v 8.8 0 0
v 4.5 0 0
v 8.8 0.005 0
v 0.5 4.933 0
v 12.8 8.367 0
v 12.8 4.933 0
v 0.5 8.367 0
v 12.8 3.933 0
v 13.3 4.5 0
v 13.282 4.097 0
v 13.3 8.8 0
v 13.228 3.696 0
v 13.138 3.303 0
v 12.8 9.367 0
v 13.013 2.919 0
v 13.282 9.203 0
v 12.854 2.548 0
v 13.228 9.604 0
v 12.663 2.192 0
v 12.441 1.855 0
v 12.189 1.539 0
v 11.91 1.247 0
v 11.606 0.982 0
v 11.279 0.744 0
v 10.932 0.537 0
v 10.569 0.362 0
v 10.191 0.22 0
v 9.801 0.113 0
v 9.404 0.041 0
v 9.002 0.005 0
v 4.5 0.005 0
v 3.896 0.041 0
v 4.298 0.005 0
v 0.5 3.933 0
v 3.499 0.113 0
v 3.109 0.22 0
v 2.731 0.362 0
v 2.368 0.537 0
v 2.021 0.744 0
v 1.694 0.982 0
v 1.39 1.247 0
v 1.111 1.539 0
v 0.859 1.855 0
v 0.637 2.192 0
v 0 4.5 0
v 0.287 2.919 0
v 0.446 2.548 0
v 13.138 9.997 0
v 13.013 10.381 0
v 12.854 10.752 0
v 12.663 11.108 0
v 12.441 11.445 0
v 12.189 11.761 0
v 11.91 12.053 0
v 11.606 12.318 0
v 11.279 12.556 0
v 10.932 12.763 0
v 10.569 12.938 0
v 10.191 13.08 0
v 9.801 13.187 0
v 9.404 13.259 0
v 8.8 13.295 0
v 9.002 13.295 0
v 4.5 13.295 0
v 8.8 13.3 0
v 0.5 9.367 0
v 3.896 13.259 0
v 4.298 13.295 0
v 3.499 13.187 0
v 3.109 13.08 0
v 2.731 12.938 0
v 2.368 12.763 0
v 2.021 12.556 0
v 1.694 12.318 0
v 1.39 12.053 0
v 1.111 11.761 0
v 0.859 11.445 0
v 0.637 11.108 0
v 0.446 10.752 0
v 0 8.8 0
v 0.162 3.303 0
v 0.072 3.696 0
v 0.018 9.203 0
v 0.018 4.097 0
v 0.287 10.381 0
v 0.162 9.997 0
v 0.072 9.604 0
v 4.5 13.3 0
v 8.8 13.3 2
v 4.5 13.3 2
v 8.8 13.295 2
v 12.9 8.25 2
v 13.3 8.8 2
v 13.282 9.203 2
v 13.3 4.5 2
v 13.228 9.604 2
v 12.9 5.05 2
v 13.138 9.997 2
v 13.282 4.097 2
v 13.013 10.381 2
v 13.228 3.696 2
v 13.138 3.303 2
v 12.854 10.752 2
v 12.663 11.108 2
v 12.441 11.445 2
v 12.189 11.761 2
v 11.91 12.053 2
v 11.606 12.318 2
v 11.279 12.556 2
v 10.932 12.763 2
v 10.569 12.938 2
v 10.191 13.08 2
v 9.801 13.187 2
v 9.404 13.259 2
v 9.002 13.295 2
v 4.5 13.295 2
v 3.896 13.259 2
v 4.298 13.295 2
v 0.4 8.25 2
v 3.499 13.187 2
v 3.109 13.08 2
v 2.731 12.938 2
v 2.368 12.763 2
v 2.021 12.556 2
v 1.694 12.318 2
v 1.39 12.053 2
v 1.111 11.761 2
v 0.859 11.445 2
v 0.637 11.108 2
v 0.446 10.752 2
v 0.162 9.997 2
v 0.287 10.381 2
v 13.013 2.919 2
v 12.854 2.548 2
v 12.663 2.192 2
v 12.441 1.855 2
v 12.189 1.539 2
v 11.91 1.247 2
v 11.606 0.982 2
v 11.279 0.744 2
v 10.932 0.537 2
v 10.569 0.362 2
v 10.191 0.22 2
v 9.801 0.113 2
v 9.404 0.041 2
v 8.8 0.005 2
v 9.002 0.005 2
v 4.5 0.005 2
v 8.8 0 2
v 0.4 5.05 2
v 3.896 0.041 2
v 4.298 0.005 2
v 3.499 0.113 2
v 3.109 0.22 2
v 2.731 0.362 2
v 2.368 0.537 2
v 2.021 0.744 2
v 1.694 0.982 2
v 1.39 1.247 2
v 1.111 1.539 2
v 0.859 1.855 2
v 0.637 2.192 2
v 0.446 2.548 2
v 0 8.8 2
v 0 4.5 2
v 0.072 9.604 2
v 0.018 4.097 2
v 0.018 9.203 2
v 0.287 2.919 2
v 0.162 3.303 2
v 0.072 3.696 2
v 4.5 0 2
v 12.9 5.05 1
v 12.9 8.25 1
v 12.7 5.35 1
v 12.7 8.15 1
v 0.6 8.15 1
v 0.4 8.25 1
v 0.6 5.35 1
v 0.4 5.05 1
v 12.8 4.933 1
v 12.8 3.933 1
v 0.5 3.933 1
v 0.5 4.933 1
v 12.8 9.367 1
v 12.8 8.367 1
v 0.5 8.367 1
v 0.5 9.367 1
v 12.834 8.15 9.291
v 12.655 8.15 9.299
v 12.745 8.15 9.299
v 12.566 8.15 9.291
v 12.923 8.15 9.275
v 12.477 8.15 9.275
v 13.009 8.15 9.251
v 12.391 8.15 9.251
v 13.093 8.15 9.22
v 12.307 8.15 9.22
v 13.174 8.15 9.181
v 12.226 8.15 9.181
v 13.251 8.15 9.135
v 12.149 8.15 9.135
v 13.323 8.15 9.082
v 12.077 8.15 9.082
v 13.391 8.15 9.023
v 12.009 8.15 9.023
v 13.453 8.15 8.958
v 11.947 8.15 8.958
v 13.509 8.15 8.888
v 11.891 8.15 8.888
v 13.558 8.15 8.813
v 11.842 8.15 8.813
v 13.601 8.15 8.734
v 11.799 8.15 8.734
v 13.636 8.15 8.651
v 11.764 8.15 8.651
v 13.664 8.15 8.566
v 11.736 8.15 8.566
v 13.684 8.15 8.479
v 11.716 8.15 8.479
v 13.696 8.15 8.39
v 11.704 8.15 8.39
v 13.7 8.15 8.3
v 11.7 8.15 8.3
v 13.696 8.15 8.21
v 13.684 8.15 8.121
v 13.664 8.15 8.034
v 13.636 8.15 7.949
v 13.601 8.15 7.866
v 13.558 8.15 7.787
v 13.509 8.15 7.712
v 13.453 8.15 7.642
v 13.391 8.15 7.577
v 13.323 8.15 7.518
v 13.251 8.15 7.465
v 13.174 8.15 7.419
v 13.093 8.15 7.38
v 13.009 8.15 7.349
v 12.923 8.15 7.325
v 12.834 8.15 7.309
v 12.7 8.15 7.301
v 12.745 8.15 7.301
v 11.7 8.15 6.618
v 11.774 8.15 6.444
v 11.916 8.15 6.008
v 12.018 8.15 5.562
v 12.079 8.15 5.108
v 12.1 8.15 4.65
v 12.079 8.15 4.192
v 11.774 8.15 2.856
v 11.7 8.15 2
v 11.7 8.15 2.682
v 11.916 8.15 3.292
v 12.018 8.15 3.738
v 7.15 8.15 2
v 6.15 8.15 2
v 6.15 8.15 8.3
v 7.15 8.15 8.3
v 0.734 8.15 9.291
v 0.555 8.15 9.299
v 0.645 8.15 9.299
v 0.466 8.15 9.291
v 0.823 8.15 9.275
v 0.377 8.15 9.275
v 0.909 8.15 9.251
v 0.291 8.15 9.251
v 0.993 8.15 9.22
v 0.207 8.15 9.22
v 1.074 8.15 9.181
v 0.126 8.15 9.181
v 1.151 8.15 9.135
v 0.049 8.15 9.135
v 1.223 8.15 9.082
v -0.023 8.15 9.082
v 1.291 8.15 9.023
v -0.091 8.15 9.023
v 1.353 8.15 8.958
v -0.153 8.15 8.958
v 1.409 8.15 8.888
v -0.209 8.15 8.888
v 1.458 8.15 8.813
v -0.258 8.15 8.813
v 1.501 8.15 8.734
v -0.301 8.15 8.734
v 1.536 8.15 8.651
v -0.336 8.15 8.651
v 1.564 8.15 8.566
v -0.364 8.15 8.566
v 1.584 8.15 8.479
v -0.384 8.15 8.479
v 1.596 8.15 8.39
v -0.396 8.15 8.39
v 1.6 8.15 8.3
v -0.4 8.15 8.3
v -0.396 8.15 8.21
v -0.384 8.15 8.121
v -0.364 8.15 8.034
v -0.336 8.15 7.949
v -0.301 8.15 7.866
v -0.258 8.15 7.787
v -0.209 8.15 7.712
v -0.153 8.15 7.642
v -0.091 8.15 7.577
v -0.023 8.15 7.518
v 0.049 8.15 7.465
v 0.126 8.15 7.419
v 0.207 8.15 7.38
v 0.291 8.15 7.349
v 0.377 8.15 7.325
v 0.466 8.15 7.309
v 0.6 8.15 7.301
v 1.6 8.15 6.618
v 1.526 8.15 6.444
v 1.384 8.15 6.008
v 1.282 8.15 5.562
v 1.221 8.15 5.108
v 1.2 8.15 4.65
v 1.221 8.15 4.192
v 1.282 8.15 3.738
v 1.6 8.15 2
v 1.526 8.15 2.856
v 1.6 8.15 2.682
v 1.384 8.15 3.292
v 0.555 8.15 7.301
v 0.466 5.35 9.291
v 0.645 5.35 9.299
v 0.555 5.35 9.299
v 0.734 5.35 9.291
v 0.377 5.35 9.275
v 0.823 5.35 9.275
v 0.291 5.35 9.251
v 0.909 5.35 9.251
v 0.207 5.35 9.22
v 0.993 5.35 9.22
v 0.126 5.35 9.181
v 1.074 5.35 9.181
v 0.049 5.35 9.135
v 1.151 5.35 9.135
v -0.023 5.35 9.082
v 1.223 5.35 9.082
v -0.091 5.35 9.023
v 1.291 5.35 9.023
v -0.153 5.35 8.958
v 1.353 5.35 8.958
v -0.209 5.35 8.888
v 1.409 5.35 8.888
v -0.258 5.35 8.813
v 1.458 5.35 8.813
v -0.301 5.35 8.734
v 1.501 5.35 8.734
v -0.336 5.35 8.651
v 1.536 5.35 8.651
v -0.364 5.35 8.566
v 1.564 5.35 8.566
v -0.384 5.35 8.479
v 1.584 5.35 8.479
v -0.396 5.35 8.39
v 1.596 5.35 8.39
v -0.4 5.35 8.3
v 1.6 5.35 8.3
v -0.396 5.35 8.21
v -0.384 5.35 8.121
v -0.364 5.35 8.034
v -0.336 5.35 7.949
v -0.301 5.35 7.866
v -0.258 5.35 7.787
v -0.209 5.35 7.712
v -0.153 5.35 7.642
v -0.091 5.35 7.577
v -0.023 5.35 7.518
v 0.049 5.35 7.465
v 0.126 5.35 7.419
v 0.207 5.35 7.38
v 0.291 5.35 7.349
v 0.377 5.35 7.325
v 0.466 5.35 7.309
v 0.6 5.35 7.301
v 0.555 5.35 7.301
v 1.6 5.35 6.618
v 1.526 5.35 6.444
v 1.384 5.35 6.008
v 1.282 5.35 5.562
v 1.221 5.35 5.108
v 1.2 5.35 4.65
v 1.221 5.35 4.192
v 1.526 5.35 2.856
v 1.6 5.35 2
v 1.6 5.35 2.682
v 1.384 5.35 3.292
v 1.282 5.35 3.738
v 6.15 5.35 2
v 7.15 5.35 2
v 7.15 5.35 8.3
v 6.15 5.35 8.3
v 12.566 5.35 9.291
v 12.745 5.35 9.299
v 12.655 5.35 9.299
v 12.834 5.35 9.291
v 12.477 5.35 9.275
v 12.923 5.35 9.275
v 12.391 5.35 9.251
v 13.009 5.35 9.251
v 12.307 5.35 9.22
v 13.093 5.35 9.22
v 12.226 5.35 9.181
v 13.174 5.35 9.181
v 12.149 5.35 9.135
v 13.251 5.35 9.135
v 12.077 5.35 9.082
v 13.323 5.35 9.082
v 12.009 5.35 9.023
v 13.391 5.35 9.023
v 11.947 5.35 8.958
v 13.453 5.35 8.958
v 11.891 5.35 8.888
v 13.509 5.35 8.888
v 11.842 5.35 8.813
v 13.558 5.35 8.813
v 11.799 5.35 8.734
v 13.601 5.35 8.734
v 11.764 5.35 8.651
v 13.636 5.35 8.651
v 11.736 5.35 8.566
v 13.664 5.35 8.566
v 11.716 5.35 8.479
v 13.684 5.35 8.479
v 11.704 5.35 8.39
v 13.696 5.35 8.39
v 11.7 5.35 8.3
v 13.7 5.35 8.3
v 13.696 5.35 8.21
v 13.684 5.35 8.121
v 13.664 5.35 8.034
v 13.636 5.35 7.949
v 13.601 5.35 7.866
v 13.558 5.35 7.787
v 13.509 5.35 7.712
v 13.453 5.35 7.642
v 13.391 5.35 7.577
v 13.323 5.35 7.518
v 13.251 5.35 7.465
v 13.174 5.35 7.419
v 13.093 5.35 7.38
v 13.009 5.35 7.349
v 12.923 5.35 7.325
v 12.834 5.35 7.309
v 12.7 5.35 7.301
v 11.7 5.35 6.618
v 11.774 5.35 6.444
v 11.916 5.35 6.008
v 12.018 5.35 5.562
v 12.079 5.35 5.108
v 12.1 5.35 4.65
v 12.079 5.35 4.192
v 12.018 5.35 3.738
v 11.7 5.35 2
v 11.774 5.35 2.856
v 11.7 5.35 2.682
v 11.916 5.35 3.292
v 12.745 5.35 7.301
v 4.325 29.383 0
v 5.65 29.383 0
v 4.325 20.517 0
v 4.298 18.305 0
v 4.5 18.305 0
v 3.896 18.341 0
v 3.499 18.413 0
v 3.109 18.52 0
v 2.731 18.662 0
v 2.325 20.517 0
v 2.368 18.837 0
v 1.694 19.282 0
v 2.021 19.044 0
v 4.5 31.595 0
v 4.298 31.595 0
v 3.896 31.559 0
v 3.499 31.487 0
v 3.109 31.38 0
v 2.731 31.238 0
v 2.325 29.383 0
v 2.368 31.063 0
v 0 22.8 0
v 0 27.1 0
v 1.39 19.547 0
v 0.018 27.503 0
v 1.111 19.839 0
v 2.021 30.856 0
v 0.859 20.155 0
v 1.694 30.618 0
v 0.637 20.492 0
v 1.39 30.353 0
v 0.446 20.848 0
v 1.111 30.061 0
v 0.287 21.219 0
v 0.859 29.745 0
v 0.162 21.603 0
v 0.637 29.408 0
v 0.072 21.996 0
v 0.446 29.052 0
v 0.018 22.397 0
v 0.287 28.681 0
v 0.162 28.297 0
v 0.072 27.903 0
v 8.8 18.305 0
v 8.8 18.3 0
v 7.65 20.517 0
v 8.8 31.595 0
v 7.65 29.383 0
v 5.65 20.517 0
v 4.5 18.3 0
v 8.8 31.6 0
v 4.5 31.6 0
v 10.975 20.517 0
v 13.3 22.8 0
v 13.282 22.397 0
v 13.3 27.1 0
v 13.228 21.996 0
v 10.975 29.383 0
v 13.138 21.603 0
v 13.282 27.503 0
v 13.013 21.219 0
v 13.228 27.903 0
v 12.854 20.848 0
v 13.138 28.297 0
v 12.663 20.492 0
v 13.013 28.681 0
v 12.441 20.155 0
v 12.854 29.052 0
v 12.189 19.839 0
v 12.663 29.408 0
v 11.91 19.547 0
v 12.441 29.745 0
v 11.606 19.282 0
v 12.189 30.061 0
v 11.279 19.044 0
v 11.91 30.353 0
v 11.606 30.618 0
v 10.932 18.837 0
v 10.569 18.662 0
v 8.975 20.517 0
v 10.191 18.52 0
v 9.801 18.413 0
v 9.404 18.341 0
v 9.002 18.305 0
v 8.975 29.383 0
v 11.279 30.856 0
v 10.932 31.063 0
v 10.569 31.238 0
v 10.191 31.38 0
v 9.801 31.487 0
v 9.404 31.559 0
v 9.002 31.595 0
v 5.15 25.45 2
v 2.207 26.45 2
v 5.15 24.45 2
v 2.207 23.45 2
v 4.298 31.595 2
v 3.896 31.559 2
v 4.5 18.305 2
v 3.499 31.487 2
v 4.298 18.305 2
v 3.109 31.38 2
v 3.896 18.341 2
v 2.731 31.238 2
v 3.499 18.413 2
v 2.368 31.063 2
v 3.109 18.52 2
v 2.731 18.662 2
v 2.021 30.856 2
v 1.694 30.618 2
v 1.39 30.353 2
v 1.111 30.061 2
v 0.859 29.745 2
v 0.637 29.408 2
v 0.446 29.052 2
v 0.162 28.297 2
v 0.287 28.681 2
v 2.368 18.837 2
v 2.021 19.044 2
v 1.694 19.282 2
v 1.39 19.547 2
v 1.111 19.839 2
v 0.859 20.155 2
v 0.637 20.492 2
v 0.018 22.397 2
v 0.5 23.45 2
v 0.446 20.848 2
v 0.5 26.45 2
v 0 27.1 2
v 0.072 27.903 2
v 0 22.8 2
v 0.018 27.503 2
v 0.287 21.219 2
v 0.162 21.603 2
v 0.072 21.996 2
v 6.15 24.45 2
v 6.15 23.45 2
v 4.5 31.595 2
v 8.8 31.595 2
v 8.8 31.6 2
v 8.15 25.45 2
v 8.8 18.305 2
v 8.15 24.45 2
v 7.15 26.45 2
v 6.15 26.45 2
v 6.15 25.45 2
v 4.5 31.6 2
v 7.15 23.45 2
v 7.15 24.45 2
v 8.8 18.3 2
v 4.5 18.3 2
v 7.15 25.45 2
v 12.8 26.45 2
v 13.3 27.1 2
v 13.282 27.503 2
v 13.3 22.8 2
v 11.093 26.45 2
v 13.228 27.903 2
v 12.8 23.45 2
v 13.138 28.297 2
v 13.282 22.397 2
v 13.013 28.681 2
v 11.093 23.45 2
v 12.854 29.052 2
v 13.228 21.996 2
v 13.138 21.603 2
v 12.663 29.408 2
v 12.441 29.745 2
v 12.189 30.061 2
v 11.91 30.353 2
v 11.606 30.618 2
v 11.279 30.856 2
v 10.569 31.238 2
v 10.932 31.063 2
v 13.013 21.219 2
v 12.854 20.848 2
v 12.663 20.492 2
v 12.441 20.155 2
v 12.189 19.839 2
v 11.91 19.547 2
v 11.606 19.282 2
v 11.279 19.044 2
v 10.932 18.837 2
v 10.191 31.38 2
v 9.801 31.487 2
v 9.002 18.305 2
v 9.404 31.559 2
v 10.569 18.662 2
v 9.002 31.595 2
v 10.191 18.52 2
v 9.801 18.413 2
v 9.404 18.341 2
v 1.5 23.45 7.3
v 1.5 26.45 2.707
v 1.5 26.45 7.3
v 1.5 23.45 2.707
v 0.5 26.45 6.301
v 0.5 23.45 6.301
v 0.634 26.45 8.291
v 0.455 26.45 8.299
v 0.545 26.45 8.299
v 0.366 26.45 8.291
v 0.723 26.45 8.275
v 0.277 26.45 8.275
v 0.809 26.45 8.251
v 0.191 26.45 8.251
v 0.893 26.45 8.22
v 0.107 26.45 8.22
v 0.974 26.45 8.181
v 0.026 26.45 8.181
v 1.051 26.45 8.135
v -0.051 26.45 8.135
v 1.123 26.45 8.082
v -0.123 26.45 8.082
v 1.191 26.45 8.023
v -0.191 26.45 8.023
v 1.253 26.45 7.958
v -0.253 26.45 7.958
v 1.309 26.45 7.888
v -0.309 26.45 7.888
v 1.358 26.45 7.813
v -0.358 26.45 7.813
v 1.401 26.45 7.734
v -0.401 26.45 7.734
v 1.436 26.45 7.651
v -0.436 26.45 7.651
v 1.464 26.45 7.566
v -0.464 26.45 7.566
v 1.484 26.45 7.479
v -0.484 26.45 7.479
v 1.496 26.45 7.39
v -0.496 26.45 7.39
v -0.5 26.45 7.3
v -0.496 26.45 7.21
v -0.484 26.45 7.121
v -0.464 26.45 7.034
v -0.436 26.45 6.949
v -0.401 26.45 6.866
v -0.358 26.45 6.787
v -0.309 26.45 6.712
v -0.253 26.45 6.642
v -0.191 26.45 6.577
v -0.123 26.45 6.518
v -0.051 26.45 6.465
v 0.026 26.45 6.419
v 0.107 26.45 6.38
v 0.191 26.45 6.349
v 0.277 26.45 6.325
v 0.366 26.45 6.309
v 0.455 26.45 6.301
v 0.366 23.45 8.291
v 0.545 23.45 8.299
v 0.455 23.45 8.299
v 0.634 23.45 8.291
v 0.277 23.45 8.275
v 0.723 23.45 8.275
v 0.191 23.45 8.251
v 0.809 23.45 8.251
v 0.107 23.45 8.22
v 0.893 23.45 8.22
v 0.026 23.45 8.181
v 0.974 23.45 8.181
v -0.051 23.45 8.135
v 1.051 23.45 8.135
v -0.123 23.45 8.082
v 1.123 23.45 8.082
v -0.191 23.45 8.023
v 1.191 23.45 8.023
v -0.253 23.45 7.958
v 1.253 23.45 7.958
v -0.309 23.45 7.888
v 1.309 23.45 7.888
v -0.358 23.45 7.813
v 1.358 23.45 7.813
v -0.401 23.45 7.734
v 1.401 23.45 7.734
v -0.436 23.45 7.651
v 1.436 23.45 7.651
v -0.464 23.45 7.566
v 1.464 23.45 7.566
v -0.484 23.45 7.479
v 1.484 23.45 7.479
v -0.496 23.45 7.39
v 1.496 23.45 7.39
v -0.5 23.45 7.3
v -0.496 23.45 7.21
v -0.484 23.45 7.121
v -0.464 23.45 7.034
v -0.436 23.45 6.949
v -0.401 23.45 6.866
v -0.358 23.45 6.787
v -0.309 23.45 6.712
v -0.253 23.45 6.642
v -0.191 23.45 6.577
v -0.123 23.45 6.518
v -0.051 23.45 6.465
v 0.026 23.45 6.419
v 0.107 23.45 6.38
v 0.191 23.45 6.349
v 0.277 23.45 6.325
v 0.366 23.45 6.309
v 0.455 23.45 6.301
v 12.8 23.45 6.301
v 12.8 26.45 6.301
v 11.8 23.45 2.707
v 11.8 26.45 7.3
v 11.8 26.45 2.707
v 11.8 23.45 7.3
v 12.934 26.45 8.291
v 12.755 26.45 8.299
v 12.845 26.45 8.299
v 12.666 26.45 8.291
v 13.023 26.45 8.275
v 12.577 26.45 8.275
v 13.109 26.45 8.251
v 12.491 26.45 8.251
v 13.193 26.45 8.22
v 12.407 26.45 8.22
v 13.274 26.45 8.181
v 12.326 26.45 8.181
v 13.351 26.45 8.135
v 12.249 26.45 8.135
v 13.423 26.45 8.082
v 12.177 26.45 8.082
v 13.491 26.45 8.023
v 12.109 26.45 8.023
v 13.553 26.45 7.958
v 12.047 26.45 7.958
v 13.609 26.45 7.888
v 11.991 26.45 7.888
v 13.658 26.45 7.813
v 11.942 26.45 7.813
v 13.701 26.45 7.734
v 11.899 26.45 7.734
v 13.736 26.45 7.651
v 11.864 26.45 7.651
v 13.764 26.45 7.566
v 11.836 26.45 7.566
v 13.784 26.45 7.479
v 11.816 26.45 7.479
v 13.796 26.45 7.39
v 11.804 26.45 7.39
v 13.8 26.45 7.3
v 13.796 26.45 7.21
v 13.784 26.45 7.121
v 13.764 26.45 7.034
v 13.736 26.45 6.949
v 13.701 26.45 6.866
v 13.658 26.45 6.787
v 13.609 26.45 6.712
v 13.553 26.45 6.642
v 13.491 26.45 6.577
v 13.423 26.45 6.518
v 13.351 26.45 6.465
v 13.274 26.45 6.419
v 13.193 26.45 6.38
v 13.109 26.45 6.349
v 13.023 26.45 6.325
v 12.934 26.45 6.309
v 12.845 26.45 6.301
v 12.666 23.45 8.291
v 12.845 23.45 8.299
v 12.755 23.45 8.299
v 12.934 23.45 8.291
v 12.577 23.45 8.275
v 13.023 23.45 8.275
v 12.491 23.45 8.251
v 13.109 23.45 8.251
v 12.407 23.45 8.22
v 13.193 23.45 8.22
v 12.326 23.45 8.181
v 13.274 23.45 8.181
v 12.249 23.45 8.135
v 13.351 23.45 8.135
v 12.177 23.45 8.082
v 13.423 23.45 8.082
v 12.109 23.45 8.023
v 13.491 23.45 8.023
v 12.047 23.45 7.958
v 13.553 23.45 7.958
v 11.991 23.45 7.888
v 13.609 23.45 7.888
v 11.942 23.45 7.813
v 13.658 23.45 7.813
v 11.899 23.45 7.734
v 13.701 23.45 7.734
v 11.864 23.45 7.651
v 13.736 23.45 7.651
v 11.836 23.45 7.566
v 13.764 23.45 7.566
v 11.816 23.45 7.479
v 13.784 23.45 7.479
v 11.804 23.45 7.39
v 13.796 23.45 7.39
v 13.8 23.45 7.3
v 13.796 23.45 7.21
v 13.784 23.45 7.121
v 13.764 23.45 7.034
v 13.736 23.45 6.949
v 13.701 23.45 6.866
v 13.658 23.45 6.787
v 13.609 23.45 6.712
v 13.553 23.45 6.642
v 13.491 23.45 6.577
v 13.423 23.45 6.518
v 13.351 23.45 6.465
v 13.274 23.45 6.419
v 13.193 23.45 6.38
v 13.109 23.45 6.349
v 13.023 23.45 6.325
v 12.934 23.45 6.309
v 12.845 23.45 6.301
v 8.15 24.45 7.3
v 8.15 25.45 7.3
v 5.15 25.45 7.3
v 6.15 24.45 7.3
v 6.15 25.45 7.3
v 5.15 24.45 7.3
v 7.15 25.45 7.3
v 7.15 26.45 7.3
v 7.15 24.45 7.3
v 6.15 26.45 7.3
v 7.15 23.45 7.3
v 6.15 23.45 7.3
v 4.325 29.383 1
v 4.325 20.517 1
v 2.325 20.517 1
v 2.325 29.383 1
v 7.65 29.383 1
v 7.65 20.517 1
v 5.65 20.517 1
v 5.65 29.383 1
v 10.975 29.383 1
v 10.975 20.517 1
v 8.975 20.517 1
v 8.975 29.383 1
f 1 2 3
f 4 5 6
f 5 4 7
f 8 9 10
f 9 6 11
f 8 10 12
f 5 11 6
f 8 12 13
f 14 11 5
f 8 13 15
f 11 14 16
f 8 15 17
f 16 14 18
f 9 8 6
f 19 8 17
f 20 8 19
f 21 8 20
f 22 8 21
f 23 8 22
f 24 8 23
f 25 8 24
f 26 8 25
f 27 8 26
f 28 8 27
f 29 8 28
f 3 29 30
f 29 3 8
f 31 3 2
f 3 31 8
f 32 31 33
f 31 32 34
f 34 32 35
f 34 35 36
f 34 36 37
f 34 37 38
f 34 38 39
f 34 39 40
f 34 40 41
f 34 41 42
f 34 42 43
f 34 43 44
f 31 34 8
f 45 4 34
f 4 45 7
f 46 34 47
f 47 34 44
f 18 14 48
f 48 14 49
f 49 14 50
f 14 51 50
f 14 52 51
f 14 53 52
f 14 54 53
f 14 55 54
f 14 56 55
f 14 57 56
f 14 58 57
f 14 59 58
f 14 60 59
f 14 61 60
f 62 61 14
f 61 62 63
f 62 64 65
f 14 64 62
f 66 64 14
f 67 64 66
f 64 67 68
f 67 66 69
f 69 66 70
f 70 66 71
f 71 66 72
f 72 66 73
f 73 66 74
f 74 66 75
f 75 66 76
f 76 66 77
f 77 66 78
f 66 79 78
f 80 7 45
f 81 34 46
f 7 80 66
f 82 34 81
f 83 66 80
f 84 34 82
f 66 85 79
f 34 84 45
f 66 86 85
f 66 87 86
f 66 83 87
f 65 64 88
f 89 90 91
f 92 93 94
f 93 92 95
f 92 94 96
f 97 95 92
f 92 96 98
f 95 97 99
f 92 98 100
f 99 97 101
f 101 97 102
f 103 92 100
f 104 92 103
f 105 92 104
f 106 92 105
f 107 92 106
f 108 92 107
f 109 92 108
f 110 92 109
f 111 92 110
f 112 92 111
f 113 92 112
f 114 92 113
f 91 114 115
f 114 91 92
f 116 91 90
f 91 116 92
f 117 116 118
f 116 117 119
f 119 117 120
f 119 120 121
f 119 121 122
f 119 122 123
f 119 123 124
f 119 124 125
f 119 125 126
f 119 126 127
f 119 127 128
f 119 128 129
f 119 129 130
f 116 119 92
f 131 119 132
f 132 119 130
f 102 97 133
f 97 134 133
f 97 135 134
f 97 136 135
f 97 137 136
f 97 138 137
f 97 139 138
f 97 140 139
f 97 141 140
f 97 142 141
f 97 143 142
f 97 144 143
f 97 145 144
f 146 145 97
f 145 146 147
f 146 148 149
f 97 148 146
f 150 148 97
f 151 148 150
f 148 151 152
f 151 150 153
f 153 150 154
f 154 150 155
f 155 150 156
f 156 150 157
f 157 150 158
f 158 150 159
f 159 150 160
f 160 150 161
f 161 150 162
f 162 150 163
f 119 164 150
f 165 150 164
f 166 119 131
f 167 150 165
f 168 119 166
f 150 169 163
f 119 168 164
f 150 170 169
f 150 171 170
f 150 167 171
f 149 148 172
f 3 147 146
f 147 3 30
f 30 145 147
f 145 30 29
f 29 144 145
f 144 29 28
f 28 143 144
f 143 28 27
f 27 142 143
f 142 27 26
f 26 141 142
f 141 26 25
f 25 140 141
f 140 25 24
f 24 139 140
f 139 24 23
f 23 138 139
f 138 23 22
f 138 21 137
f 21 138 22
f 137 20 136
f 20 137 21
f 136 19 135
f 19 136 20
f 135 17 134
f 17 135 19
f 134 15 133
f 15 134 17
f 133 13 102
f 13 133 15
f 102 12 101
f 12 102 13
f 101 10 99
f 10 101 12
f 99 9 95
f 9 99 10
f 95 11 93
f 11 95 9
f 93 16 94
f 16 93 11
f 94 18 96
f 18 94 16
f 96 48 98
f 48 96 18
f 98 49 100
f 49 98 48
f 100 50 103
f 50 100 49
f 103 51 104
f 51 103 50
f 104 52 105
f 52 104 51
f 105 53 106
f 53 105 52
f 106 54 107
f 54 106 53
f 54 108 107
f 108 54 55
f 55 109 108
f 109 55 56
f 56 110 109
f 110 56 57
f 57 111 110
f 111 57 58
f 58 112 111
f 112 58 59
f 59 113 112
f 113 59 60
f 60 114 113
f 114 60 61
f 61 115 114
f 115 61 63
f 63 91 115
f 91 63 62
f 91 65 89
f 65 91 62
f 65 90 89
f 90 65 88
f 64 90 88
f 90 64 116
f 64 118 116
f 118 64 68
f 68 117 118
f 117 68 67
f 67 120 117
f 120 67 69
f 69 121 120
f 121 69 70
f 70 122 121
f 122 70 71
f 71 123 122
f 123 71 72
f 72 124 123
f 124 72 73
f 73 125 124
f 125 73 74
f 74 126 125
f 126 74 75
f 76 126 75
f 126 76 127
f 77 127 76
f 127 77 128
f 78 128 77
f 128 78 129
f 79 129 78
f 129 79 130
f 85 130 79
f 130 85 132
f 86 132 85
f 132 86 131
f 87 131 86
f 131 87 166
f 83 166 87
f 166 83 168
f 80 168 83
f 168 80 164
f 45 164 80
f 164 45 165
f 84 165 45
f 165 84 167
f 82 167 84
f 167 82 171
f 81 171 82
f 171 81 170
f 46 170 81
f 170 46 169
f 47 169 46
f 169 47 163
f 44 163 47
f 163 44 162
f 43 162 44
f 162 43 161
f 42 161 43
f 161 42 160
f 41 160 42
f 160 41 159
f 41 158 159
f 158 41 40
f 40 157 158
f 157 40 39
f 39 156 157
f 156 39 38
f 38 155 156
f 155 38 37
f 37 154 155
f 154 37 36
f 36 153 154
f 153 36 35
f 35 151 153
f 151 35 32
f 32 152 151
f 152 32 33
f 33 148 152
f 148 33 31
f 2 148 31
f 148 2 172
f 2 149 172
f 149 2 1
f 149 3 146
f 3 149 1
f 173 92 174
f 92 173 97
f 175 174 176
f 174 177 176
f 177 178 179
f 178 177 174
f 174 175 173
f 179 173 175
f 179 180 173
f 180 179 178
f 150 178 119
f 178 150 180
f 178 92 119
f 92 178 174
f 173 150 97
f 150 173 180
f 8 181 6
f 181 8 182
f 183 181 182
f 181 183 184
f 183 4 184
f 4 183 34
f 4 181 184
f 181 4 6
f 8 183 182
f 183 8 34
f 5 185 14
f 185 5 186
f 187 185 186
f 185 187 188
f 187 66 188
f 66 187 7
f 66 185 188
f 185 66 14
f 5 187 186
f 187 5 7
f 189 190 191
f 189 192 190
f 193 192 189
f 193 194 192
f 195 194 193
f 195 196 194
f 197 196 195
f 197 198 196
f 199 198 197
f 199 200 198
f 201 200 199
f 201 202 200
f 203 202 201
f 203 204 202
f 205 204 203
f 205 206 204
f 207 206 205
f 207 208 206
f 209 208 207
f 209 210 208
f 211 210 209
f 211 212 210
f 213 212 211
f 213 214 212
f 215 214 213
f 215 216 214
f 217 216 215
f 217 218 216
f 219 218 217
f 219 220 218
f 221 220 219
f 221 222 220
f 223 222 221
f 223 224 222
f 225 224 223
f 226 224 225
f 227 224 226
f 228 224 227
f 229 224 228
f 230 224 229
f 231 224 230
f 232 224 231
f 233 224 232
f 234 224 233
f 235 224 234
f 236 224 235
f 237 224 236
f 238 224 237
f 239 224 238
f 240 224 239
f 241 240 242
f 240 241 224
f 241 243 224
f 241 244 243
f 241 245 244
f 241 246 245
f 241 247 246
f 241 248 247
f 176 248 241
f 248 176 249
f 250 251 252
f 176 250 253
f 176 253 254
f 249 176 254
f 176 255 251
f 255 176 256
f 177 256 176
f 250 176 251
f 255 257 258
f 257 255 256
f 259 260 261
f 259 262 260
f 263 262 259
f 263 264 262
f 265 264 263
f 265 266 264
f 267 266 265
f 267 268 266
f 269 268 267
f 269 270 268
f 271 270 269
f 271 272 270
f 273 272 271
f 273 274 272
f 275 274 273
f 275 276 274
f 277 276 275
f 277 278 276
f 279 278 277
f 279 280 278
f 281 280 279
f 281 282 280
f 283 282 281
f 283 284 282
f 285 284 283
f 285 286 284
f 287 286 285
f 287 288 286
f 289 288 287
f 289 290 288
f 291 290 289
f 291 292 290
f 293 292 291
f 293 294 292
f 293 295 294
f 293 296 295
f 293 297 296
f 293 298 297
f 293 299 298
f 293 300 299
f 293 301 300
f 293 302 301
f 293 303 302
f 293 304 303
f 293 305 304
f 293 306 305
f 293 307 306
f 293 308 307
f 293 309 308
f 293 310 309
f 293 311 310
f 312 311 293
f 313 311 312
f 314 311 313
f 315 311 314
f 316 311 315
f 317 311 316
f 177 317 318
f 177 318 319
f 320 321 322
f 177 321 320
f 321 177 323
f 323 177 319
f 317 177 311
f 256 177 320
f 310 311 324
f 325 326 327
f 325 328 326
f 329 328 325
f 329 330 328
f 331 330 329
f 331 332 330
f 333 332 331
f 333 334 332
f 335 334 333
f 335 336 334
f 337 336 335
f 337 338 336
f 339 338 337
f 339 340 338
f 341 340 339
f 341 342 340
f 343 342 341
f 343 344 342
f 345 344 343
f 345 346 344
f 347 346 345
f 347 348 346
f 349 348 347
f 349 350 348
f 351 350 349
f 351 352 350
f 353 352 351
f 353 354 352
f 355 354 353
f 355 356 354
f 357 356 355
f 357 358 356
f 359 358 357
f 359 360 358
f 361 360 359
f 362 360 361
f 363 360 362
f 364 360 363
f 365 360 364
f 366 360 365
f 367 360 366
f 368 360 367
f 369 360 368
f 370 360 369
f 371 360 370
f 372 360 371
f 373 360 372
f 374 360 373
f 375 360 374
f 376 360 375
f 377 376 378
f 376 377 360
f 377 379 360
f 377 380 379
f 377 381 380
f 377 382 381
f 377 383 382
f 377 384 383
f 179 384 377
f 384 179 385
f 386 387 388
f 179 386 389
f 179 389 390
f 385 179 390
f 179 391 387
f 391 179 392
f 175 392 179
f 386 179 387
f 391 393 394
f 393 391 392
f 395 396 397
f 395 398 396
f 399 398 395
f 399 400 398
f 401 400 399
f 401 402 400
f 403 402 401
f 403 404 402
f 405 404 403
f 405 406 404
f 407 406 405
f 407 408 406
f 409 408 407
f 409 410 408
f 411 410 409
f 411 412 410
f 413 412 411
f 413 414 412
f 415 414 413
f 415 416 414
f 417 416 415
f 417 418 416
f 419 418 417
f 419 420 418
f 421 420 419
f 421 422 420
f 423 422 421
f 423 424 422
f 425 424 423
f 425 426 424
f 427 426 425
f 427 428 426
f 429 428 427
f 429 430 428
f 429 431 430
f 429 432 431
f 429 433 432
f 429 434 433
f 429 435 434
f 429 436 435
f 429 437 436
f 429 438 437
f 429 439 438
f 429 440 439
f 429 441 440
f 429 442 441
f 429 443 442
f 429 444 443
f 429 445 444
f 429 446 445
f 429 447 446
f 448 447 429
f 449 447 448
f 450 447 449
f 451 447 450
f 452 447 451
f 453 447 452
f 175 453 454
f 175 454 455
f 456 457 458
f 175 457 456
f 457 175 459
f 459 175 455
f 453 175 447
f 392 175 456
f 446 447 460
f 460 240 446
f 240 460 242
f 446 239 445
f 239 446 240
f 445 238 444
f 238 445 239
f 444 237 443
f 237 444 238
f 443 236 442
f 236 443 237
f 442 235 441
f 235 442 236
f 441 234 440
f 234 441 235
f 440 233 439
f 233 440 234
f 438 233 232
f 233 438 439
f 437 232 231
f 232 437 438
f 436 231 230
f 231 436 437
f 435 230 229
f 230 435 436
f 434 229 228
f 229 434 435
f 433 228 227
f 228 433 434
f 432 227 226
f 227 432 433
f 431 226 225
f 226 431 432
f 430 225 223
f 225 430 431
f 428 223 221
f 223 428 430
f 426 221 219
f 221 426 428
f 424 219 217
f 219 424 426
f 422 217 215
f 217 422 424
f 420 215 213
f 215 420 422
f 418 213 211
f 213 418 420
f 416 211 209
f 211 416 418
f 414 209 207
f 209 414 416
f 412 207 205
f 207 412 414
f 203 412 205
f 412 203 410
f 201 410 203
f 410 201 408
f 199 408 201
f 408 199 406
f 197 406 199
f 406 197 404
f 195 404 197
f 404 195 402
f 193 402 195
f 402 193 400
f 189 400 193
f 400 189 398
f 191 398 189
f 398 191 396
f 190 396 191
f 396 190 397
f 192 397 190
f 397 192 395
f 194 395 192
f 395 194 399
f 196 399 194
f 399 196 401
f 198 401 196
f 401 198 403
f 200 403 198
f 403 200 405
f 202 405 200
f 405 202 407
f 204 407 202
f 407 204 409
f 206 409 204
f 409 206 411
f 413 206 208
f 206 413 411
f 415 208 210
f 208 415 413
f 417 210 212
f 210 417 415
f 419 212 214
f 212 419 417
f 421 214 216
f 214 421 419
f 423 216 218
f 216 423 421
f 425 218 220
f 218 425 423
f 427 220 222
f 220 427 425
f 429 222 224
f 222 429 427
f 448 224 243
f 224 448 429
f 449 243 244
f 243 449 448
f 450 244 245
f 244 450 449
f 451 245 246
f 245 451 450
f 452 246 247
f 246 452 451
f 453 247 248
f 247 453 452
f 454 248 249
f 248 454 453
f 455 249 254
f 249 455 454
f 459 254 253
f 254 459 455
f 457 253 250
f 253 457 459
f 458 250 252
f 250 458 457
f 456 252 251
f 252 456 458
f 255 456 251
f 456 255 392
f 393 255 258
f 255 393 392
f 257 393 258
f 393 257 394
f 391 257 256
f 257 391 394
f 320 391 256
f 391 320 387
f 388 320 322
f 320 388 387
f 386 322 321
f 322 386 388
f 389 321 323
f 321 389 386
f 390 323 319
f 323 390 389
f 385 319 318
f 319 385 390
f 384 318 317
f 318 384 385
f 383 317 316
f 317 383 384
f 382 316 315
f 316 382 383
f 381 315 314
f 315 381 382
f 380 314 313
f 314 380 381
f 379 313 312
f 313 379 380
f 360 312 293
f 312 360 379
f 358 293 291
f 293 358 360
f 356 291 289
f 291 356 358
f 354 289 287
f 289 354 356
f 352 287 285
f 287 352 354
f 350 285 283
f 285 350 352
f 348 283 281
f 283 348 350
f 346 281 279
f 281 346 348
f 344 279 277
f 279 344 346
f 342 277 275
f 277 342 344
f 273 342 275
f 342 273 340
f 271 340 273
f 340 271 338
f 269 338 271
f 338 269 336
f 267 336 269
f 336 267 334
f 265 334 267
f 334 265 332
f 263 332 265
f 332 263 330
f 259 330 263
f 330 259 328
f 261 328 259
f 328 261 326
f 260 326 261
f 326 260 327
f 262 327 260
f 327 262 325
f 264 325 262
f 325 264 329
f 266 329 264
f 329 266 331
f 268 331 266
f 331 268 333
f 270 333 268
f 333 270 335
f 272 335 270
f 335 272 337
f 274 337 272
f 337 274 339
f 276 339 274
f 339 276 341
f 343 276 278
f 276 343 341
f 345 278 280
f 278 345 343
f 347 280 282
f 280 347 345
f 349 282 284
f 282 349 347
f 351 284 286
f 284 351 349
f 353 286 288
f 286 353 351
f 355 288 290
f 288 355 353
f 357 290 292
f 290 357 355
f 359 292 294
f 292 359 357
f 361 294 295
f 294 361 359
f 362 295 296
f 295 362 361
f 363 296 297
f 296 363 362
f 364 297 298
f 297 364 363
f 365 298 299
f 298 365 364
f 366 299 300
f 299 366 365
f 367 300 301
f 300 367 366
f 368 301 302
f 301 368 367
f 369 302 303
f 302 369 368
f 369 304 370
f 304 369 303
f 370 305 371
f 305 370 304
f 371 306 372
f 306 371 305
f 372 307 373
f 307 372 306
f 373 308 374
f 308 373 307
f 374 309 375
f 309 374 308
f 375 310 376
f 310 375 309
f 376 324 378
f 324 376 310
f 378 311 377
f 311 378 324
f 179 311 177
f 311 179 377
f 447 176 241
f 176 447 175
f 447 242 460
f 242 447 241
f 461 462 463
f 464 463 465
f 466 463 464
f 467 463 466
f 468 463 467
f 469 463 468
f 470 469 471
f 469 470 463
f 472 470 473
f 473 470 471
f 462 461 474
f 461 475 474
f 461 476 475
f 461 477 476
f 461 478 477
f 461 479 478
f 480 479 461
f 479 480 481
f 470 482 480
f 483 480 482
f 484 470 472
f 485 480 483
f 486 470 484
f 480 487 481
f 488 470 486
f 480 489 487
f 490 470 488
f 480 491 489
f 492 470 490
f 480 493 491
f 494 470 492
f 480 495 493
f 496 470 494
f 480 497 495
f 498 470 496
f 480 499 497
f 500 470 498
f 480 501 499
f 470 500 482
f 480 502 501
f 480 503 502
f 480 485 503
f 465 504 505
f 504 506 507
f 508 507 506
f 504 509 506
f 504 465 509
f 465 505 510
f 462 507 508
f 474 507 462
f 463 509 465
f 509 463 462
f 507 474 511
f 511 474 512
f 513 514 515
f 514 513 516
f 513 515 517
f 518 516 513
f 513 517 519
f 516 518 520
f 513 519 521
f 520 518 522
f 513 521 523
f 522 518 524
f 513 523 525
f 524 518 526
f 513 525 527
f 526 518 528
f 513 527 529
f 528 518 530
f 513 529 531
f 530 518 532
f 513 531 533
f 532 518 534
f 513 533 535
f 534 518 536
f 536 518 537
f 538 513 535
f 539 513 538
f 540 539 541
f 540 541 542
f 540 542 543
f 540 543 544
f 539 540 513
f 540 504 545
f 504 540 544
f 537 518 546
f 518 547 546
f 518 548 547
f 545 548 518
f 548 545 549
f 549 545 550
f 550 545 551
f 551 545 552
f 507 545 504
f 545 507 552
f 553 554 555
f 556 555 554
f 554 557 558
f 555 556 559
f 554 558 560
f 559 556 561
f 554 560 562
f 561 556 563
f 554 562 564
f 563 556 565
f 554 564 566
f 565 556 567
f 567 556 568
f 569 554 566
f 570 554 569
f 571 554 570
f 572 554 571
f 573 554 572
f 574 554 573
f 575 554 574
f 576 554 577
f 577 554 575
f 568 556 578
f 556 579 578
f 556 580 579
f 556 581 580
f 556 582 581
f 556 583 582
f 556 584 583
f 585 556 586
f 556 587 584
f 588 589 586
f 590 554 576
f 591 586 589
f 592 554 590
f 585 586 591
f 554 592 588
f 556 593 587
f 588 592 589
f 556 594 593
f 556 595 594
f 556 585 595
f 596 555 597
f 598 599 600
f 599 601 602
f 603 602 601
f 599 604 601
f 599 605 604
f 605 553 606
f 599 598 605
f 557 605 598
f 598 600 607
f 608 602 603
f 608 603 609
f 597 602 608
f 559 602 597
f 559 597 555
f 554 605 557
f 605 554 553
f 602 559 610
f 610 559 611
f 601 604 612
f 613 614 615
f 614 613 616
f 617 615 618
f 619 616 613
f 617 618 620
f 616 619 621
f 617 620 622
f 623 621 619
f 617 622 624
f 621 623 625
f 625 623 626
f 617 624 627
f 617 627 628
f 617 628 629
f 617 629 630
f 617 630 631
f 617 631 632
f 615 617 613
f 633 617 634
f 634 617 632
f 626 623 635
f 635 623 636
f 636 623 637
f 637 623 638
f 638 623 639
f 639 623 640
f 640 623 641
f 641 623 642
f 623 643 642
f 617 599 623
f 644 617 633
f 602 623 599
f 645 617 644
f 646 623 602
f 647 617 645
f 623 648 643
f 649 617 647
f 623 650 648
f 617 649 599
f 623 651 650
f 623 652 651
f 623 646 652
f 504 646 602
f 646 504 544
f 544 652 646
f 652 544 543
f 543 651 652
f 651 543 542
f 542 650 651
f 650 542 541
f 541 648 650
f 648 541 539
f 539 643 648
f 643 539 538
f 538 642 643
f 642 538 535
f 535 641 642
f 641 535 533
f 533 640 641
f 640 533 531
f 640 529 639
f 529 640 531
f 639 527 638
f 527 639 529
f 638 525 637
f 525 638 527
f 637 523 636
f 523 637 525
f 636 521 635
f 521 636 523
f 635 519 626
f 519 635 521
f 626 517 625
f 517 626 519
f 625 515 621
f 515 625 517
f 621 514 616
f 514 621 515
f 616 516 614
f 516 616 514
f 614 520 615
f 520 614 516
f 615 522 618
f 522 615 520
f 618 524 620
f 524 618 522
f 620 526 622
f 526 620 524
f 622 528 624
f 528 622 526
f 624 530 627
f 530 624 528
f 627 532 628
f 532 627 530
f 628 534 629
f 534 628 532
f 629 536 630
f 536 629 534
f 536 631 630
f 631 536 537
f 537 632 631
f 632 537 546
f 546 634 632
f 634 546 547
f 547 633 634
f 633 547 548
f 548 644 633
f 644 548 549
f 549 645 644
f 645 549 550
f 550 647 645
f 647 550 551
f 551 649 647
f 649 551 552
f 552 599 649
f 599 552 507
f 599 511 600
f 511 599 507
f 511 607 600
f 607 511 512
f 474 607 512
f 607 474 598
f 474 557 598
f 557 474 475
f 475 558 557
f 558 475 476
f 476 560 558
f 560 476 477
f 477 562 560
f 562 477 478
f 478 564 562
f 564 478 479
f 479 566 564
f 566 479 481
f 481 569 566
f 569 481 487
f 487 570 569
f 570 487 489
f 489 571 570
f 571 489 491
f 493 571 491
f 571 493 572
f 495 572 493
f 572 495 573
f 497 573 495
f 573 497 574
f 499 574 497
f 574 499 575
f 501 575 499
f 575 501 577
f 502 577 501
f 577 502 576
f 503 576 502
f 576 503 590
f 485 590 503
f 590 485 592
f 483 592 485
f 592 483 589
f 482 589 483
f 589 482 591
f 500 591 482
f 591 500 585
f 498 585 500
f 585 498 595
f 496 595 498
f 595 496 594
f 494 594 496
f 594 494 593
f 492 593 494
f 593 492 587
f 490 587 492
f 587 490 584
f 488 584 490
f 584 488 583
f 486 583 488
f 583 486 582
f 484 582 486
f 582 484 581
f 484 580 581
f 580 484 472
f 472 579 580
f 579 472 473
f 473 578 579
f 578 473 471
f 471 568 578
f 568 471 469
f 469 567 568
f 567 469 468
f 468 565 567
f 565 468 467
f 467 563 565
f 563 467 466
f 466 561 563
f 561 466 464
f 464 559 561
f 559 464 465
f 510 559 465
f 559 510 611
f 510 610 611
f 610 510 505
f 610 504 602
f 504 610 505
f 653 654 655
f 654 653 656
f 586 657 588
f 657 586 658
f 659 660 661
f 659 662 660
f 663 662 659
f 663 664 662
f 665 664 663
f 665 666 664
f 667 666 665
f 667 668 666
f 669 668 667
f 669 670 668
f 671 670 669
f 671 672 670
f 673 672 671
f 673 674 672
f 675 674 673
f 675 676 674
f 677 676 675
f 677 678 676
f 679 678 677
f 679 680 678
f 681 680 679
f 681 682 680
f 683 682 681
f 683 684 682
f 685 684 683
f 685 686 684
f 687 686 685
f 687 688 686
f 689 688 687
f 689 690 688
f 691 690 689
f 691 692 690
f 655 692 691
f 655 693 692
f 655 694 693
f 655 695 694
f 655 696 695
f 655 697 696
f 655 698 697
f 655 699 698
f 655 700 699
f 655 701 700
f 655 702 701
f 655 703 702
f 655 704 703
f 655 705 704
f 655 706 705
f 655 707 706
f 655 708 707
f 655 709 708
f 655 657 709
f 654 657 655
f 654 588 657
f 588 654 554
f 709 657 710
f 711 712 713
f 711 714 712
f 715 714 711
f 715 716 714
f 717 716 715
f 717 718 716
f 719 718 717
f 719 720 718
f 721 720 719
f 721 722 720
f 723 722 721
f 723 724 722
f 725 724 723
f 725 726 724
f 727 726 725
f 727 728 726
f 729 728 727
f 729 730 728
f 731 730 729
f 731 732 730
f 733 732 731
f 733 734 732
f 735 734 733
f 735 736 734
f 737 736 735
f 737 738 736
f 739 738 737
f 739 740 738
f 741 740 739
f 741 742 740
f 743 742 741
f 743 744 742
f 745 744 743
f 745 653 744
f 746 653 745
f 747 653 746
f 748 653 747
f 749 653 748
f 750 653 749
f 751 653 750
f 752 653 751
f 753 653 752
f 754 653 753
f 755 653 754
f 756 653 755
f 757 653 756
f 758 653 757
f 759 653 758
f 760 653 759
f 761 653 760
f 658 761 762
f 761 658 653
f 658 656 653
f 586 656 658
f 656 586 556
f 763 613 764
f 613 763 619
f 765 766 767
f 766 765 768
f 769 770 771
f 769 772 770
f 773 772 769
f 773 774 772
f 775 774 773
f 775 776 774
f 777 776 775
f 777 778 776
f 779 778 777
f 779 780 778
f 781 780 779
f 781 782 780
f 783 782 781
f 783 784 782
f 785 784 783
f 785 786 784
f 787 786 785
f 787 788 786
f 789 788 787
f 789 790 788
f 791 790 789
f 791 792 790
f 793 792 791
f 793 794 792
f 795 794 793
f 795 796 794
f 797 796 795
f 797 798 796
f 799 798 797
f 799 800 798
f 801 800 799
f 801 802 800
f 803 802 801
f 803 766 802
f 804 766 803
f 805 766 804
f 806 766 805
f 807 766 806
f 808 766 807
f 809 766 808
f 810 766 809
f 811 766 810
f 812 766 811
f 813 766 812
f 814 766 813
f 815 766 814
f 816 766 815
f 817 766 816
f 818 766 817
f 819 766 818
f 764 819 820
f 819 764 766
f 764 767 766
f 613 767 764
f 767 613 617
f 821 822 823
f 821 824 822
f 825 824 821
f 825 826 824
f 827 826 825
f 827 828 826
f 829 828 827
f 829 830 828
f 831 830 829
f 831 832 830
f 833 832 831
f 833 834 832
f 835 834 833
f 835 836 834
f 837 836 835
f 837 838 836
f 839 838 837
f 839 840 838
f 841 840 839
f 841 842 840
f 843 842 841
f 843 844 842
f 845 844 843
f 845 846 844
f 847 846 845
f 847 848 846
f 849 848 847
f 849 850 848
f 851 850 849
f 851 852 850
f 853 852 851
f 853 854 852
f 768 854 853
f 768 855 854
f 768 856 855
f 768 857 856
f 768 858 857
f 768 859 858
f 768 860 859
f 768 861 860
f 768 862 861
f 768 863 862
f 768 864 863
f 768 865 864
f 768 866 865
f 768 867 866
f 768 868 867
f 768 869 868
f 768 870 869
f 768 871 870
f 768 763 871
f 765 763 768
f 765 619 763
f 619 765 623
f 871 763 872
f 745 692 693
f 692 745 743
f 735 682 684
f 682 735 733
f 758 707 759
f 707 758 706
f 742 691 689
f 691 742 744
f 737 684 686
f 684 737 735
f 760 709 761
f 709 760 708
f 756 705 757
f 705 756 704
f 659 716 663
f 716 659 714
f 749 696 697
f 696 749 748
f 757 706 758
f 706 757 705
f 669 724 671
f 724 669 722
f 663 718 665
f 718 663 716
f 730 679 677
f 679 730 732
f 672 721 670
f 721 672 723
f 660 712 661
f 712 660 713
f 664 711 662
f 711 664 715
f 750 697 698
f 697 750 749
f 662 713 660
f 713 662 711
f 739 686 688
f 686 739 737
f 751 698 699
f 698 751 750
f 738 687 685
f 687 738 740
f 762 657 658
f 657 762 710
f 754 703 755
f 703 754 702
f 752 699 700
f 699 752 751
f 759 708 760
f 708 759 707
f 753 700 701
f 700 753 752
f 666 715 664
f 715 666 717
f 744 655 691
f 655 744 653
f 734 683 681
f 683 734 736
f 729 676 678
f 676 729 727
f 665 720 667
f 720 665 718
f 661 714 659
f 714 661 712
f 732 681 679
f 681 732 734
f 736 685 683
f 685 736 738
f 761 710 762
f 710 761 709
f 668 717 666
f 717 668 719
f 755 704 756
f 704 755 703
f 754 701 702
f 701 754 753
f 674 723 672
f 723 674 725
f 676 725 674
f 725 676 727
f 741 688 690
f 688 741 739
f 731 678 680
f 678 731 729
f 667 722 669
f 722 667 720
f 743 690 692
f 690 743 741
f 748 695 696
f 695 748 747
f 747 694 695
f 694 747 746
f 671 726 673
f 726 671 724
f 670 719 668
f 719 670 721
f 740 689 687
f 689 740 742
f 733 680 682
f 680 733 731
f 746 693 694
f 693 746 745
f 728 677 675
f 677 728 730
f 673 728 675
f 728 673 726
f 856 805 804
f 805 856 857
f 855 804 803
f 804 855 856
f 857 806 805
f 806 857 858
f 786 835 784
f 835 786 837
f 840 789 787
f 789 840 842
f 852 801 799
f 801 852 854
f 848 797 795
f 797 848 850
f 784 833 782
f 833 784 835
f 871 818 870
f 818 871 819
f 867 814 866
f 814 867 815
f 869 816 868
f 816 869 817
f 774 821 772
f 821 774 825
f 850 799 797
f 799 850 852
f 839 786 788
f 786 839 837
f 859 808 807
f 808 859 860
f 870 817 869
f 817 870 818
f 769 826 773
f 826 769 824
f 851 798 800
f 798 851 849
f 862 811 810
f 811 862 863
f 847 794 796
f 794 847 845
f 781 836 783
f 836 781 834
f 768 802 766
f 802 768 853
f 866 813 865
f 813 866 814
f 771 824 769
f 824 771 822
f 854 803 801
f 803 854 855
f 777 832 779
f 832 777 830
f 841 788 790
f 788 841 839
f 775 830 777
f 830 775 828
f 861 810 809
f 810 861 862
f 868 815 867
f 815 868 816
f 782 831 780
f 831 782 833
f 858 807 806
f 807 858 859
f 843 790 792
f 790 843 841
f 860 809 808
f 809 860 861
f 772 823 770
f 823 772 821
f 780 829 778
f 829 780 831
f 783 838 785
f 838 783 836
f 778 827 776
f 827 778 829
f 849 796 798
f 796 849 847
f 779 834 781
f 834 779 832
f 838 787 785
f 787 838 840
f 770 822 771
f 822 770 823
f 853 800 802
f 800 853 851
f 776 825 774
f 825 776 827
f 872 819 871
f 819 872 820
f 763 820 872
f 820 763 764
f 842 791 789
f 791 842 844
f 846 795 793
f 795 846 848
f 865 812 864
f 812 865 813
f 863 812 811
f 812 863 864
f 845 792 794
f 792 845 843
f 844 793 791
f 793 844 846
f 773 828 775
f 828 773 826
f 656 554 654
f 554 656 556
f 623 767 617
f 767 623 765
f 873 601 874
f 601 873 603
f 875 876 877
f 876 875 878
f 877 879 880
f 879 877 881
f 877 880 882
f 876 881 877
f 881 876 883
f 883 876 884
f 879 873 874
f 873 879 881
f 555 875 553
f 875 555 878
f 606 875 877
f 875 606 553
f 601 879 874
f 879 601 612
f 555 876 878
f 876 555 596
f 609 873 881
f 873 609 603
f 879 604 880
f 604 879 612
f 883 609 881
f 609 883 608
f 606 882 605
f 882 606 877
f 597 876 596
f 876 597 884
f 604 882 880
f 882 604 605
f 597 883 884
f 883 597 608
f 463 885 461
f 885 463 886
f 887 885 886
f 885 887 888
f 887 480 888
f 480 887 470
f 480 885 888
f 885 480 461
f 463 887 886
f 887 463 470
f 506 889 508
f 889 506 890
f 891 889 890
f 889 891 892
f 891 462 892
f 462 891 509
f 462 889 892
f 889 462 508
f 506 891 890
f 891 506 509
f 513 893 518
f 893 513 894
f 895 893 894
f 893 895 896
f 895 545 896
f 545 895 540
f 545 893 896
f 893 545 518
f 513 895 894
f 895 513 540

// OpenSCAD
// Gombik z Holiaceho Strojceka
// 20260707, Ondrej DURAS (dury) NOKIA

/* [Config] */
preview="basic"; // [basic,plate]
$fn=70;  // [10:10:100]
spi=0.1; // odstup kolika
spo=0.1; // odstup diery
spp=5.0; // odstup medzi suciastkami na vyrobnej doske
nox=2;   // pocet gombikov v smere X
noy=4;   // pocet gombikov v smere Y

// hrana stvorca
butWidth=13.3;
// vyska gombika od podlozky po stred stredoveho kriza. okrajove kolicky su este o polovicu hrubky kolicka (polomer valca) vyssie
butHight=7.3;  
// zaoblenie hran stvorca
butRound=4.5;  
// hrana stredoveho kriza
butCross=3.0;
// hrubka hrany stredoveho kriza
butCrosI=1.0;
// hrubka materialu zakladnej dosky tlacitka
butTickB=2.0;
// hrubka postrannych istiacich kolickov smerom do vnutra stvorca
butTickI=1.0; // 1.5 bolo hrube
// polomer valceka zachytu na istiacich kolickoch, musi byt mesi ako butTickI
butTickX=1.0;
// hrubka postrannych kolickov po hrane tlacitka
butTickH=3.0;  // 4.0 bolo hrube
colorButtonX="#b0b050"; // farba materialu gombika
colorButtonY="#50b0b0"; // farba materialu gombika


module hcButton_OFFv1(bw=butWidth,bh=butHight,br=butRound,bcs=butCross,bci=butCrosI,btb=butTickB,bti=butTickI,btx=butTickX,bth=butTickH) {
    b1=bw-br;
    r1=br+1;
    difference() {
    color(colorButtonX) 
    union() {
        linear_extrude(butTickB) {
        union() {
        difference() {
            square(bw);
            translate([-1,-1]) square(r1); // lavy predny vyrez pre zaoblenie
            translate([b1,-1]) square(r1); // pravy predny
            translate([-1,b1]) square(r1); // lavy zadny
            translate([b1,b1]) square(r1); // pravy zadny
        } // diff
            translate([br,br]) circle(r=br); // lave predne zaoblenie
            translate([b1,br]) circle(r=br); // prave predne
            translate([br,b1]) circle(r=br); // lave zadne
            translate([b1,b1]) circle(r=br); // prave zadne
       
 
        } // union
        } // extr
        translate([0,bw/2-bth/2,0])      cube([bti,bth,bh]);  // lava palicka
        translate([bw-bti,bw/2-bth/2,0]) cube([bti,bth,bh]);  // prava palicka
        translate([0,bw/2-bth/2,bh-btx]) rotate([-90,0,0]) cylinder(h=bth,r=btx);  // zachyt na lavej palicke      
        translate([bw,bw/2-bth/2,bh-btx]) rotate([-90,0,0]) cylinder(h=bth,r=btx); // zachyt na pravej palicke

        translate([bw/2-bcs/2,bw/2-bci/2,0]) cube([bcs,bci,bh]);
        translate([bw/2-bci/2,bw/2-bcs/2,0]) cube([bci,bcs,bh]);
    }  // uniV
        for(i=[1:1:3]) {
          color(colorButtonY)  translate([bw/4*i-btb/2,bw/6,-0.001]) cube([btb,bw/3*2,btb/2+0.001]);
        }
    } // diffV
}     

module hcButton(bw=butWidth,bh=butHight,br=butRound,bcs=butCross,bci=butCrosI,btb=butTickB,bti=butTickI,btx=butTickX,bth=butTickH) {

// POCITANIE : "PRUZNY VYREZ"
// ak B je polovica sirky vyrezu a D je hlbka prepadu vyrezu, potom 
// C je polomer valca, ktory treba od kvadra odrezat, aby na nom vznikol pruzny vyrez
// C=(B*B-D*D)/2D+D ... vypocet polomeru valca
// A - vzdialenost stredu valca od (zatial) rovnej hrany kvadra do ktorej sa vyrezava "pruzny vyrez"
// A = C-D (polomer valca - hlbka vyhlbenia)
// alebo pocitajme najprv vzdialenost valca od kvadra A=(BB-DD)/2D
// a potom jeho polomer ako C=A+D

// v kontexte gombika pre holiaci strojcek:
// D=butTickI/2 ... bti/2 ,teda polovica hrubky palicky/istiaceho kolicka ...teda cca 0.75mm
// B=2*butHight/6 ... bh/3
// A=(bh/3*bh/3-bti/2*bti/2)/2*bti/2 = (bh*bh/6-bti*bti/4)/bti = (bh*bh/6/bti)-(bti/4)
// C = A + D = A + bti/2

    b1=bw-br; // konstanty pre vypocitanie zaoblenia
    r1=br+1;
    //aa=bh*bh/bti/6-bti/4; // vzdialenost valca pre pruzny vyrez
    sf=bti/2;             // hlbka pruzneho vyrezu, ale zaroven posun(shift) od okraja gombika
    aa=bh*bh/sf/3-sf/2;   // vzdialenost valca pruzneho vyrezu po zjednoduseni vypoctu
    cc=aa+bti/2;          // polomer valca pruzneho vyrezu

    difference() {
    color(colorButtonX) 
    union() {
        linear_extrude(butTickB) {
        union() {
        difference() {
            square(bw);
            translate([-1,-1]) square(r1); // lavy predny vyrez pre zaoblenie
            translate([b1,-1]) square(r1); // pravy predny
            translate([-1,b1]) square(r1); // lavy zadny
            translate([b1,b1]) square(r1); // pravy zadny
        } // diff
            translate([br,br]) circle(r=br); // lave predne zaoblenie
            translate([b1,br]) circle(r=br); // prave predne
            translate([br,b1]) circle(r=br); // lave zadne
            translate([b1,b1]) circle(r=br); // prave zadne
       
 
        } // union
        } // extr
        translate([sf,bw/2-bth/2,0])      cube([bti,bth,bh]);  // lava palicka
        translate([bw-bti-sf,bw/2-bth/2,0]) cube([bti,bth,bh]);  // prava palicka
        rxx=btx*2/3; // polomer zachytneho valca na konci kolicka
        translate([sf,bw/2-bth/2,bh]) rotate([-90,0,0]) cylinder(h=bth,r=btx);  // zachyt na lavej palicke      
        translate([bw-sf,bw/2-bth/2,bh]) rotate([-90,0,0]) cylinder(h=bth,r=btx); // zachyt na pravej palicke

        translate([sf+bti,bw/2,btb]) rotate([0,45,0]) cube([btb/2,bth,btb/2], center=true);  //opora lavej palicky
        translate([bw-bti-sf,bw/2,btb])  rotate([0,45,0]) cube([btb/2,bth,btb/2], center=true);  //opora pravej palicky

        translate([bw/2-bcs/2,bw/2-bci/2,0]) cube([bcs,bci,bh]); //stredovy kriz - hrana zlava do prava
        translate([bw/2-bci/2,bw/2-bcs/2,0]) cube([bci,bcs,bh]); // stredovy kriz - hrana zpredu do zadu
    }  // uniV
        for(i=[1:1:3]) {  // tri vyhlbenia pre vytiahnutie tlacitka v pripade, ze ho bude treba vymenit
          color(colorButtonY)  translate([bw/4*i-btb/2,bw/6,-0.001]) cube([btb,bw/3*2,btb/2+0.001]);
        }
    } // diffV
}     

module baseButton(bw=butWidth,bh=butHight,br=butRound,bcs=butCross,bci=butCrosI,btb=butTickB,bti=butTickI,btx=butTickX,bth=butTickH) {
// horizontalna cast gombika, do ktorej sa potom "zapichne ta vertikalna
// zakladna aj vyrobna poloha gombika su identicke ... skutocna pracovna poloha je otocena o Y-180'. 

    b1=bw-br; // konstanty pre vypocitanie zaoblenia
    r1=br+1;
    //aa=bh*bh/bti/6-bti/4; // vzdialenost valca pre pruzny vyrez
    sf=bti/2;             // hlbka pruzneho vyrezu, ale zaroven posun(shift) od okraja gombika
    aa=bh*bh/sf/3-sf/2;   // vzdialenost valca pruzneho vyrezu po zjednoduseni vypoctu
    cc=aa+bti/2;          // polomer valca pruzneho vyrezu

    difference() {
        color(colorButtonX)
        linear_extrude(butTickB) {
        union() {
        difference() {
            square(bw);
            translate([-1,-1]) square(r1); // lavy predny vyrez pre zaoblenie
            translate([b1,-1]) square(r1); // pravy predny
            translate([-1,b1]) square(r1); // lavy zadny
            translate([b1,b1]) square(r1); // pravy zadny
        } // diff
            translate([br,br]) circle(r=br); // lave predne zaoblenie
            translate([b1,br]) circle(r=br); // prave predne
            translate([br,b1]) circle(r=br); // lave zadne
            translate([b1,b1]) circle(r=br); // prave zadne
       
 
        } // union
        } // extr
    translate([sf-spo,bw/2-bth/2-spo,btb/2]) cube([bw-2*sf+2*spo,bth+2*spo,btb/2+1]); // siroby vyrez na vrchu (prac. na spodku) pre stickButton
    translate([sf,bw/3-bti/2,-1]) cube([bw-2*sf,bti,bti+1]);   // predny vyrez pre vytiahnutie kliestami
    translate([sf,bw*2/3-bti/2,-1]) cube([bw-2*sf,bti,bti+1]); // zadny  vyrez pre vytiahnutie kliestami
    
    } //diff 
}     

/* [POCITANIE PRUZNEHO VYREZU] */
// ak B je polovica sirky vyrezu a D je hlbka prepadu vyrezu, potom 
// C je polomer valca, ktory treba od kvadra odrezat, aby na nom vznikol pruzny vyrez
// C=(B*B-D*D)/2D+D ... vypocet polomeru valca
// A - vzdialenost stredu valca od (zatial) rovnej hrany kvadra do ktorej sa vyrezava "pruzny vyrez"
// A = C-D (polomer valca - hlbka vyhlbenia)
// alebo pocitajme najprv vzdialenost valca od kvadra A=(BB-DD)/2D
// a potom jeho polomer ako C=A+D

// v kontexte gombika pre holiaci strojcek:
// D=butTickI/2 ... bti/2 ,teda polovica hrubky palicky/istiaceho kolicka ...teda cca 0.75mm
// B=2*butHight/6 ... bh/3
// A=(bh/3*bh/3-bti/2*bti/2)/2*bti/2 = (bh*bh/6-bti*bti/4)/bti = (bh*bh/6/bti)-(bti/4)
// C = A + D = A + bti/2
module stickButton(bw=butWidth,bh=butHight,br=butRound,bcs=butCross,bci=butCrosI,btb=butTickB,bti=butTickI,btx=butTickX,bth=butTickH) {
// vertikalna cast gombika do holiaceho strojceka
// mala by byt priblizne v tvare greckeho pismena PI, pricom
// v zakladnej polohe je vrchnou strieskou opreta o osu X
// referencny bod je v leziacej zakladnej / vyrobnej polohe vpredu vlavo dole
// v pracovnej polohe - vertikalnej sa vklada do spodnej casti horizontalnej casti gombika
    b1=bw-br; // konstanty pre vypocitanie zaoblenia
    r1=br+1;
    //aa=bh*bh/bti/6-bti/4; // vzdialenost valca pre pruzny vyrez
    sf=bti/2;             // hlbka pruzneho vyrezu, ale zaroven posun(shift) od okraja gombika
    //aa=bh*bh/sf/3-sf/2;   // vzdialenost valca pruzneho vyrezu po zjednoduseni vypoctu
    //cc=aa+bti/2;          // polomer valca pruzneho vyrezu

    bb=bh*2/3;  // polovica sirky vyrezu
    dd=bti*2/5; // hlbka vyrezu
    cc=(bb*bb-dd*dd)/2*dd+dd;
    aa=cc-dd;

    color(colorButtonY)
    linear_extrude(bth-2*spi,convexity=5) { union() {
        translate([sf+spi,0]) square([bw-2*(sf+spi),btb/2]); // zakladna "strieska" pismena PI
        difference() {
        translate([sf+spi,0]) square([bti,bh]); // lava palicka pismena PI
            translate([sf+spi+bti+aa,bh/2]) circle(r=cc); // pruzny vyrez
        }
        difference() {
        translate([bw-sf-bti-spi,0]) square([bti,bh]); // prava palicka
            translate([bw-sf-bti-spi-aa,bh/2]) circle(r=cc); // pruzny vyrez
        }
        translate([bw/2-bti/2,0]) square([bti,bh]); // stredna palicka
        translate([sf+spi,bh]) circle(r=bti);
        translate([bw-sf-spi,bh]) circle(r=bti);
    }}
}     

module deployButton(bw=butWidth,bh=butHight,br=butRound,bcs=butCross,bci=butCrosI,btb=butTickB,bti=butTickI,btx=butTickX,bth=butTickH) {
    baseButton();
    translate([0,bw/2+bth/2,btb/2]) rotate([90,0,0]) stickButton();
}

module onPlateButton(bw=butWidth,bh=butHight,br=butRound,bcs=butCross,bci=butCrosI,btb=butTickB,bti=butTickI,btx=butTickX,bth=butTickH) {
    baseButton();
    translate([bw+spp,0,0]) stickButton();
}

module preview(preview=preview) {
    if(preview=="basic_2") { hcButton(); }
    if(preview=="plate_2") {
        for(y=[0:1:noy-1]) for(x=[0:1:nox-1]) { 
            translate([x*(butWidth+spp),y*(butWidth+spp),0]) hcButton(); 
        }
    }
    if(preview=="basic") { deployButton(); translate([0,butWidth+spp,0]) hcButton(); }
    if(preview=="plate") { 
        for(y=[0:1:noy-1]) for(x=[0:1:nox-1]) { 
            translate([x*2*(butWidth+spp),y*(butWidth+spp),0]) 
            //hcButton(); 
            onPlateButton(); }
        }
}

/* [Preview] */
preview();

// --- end ---
      
